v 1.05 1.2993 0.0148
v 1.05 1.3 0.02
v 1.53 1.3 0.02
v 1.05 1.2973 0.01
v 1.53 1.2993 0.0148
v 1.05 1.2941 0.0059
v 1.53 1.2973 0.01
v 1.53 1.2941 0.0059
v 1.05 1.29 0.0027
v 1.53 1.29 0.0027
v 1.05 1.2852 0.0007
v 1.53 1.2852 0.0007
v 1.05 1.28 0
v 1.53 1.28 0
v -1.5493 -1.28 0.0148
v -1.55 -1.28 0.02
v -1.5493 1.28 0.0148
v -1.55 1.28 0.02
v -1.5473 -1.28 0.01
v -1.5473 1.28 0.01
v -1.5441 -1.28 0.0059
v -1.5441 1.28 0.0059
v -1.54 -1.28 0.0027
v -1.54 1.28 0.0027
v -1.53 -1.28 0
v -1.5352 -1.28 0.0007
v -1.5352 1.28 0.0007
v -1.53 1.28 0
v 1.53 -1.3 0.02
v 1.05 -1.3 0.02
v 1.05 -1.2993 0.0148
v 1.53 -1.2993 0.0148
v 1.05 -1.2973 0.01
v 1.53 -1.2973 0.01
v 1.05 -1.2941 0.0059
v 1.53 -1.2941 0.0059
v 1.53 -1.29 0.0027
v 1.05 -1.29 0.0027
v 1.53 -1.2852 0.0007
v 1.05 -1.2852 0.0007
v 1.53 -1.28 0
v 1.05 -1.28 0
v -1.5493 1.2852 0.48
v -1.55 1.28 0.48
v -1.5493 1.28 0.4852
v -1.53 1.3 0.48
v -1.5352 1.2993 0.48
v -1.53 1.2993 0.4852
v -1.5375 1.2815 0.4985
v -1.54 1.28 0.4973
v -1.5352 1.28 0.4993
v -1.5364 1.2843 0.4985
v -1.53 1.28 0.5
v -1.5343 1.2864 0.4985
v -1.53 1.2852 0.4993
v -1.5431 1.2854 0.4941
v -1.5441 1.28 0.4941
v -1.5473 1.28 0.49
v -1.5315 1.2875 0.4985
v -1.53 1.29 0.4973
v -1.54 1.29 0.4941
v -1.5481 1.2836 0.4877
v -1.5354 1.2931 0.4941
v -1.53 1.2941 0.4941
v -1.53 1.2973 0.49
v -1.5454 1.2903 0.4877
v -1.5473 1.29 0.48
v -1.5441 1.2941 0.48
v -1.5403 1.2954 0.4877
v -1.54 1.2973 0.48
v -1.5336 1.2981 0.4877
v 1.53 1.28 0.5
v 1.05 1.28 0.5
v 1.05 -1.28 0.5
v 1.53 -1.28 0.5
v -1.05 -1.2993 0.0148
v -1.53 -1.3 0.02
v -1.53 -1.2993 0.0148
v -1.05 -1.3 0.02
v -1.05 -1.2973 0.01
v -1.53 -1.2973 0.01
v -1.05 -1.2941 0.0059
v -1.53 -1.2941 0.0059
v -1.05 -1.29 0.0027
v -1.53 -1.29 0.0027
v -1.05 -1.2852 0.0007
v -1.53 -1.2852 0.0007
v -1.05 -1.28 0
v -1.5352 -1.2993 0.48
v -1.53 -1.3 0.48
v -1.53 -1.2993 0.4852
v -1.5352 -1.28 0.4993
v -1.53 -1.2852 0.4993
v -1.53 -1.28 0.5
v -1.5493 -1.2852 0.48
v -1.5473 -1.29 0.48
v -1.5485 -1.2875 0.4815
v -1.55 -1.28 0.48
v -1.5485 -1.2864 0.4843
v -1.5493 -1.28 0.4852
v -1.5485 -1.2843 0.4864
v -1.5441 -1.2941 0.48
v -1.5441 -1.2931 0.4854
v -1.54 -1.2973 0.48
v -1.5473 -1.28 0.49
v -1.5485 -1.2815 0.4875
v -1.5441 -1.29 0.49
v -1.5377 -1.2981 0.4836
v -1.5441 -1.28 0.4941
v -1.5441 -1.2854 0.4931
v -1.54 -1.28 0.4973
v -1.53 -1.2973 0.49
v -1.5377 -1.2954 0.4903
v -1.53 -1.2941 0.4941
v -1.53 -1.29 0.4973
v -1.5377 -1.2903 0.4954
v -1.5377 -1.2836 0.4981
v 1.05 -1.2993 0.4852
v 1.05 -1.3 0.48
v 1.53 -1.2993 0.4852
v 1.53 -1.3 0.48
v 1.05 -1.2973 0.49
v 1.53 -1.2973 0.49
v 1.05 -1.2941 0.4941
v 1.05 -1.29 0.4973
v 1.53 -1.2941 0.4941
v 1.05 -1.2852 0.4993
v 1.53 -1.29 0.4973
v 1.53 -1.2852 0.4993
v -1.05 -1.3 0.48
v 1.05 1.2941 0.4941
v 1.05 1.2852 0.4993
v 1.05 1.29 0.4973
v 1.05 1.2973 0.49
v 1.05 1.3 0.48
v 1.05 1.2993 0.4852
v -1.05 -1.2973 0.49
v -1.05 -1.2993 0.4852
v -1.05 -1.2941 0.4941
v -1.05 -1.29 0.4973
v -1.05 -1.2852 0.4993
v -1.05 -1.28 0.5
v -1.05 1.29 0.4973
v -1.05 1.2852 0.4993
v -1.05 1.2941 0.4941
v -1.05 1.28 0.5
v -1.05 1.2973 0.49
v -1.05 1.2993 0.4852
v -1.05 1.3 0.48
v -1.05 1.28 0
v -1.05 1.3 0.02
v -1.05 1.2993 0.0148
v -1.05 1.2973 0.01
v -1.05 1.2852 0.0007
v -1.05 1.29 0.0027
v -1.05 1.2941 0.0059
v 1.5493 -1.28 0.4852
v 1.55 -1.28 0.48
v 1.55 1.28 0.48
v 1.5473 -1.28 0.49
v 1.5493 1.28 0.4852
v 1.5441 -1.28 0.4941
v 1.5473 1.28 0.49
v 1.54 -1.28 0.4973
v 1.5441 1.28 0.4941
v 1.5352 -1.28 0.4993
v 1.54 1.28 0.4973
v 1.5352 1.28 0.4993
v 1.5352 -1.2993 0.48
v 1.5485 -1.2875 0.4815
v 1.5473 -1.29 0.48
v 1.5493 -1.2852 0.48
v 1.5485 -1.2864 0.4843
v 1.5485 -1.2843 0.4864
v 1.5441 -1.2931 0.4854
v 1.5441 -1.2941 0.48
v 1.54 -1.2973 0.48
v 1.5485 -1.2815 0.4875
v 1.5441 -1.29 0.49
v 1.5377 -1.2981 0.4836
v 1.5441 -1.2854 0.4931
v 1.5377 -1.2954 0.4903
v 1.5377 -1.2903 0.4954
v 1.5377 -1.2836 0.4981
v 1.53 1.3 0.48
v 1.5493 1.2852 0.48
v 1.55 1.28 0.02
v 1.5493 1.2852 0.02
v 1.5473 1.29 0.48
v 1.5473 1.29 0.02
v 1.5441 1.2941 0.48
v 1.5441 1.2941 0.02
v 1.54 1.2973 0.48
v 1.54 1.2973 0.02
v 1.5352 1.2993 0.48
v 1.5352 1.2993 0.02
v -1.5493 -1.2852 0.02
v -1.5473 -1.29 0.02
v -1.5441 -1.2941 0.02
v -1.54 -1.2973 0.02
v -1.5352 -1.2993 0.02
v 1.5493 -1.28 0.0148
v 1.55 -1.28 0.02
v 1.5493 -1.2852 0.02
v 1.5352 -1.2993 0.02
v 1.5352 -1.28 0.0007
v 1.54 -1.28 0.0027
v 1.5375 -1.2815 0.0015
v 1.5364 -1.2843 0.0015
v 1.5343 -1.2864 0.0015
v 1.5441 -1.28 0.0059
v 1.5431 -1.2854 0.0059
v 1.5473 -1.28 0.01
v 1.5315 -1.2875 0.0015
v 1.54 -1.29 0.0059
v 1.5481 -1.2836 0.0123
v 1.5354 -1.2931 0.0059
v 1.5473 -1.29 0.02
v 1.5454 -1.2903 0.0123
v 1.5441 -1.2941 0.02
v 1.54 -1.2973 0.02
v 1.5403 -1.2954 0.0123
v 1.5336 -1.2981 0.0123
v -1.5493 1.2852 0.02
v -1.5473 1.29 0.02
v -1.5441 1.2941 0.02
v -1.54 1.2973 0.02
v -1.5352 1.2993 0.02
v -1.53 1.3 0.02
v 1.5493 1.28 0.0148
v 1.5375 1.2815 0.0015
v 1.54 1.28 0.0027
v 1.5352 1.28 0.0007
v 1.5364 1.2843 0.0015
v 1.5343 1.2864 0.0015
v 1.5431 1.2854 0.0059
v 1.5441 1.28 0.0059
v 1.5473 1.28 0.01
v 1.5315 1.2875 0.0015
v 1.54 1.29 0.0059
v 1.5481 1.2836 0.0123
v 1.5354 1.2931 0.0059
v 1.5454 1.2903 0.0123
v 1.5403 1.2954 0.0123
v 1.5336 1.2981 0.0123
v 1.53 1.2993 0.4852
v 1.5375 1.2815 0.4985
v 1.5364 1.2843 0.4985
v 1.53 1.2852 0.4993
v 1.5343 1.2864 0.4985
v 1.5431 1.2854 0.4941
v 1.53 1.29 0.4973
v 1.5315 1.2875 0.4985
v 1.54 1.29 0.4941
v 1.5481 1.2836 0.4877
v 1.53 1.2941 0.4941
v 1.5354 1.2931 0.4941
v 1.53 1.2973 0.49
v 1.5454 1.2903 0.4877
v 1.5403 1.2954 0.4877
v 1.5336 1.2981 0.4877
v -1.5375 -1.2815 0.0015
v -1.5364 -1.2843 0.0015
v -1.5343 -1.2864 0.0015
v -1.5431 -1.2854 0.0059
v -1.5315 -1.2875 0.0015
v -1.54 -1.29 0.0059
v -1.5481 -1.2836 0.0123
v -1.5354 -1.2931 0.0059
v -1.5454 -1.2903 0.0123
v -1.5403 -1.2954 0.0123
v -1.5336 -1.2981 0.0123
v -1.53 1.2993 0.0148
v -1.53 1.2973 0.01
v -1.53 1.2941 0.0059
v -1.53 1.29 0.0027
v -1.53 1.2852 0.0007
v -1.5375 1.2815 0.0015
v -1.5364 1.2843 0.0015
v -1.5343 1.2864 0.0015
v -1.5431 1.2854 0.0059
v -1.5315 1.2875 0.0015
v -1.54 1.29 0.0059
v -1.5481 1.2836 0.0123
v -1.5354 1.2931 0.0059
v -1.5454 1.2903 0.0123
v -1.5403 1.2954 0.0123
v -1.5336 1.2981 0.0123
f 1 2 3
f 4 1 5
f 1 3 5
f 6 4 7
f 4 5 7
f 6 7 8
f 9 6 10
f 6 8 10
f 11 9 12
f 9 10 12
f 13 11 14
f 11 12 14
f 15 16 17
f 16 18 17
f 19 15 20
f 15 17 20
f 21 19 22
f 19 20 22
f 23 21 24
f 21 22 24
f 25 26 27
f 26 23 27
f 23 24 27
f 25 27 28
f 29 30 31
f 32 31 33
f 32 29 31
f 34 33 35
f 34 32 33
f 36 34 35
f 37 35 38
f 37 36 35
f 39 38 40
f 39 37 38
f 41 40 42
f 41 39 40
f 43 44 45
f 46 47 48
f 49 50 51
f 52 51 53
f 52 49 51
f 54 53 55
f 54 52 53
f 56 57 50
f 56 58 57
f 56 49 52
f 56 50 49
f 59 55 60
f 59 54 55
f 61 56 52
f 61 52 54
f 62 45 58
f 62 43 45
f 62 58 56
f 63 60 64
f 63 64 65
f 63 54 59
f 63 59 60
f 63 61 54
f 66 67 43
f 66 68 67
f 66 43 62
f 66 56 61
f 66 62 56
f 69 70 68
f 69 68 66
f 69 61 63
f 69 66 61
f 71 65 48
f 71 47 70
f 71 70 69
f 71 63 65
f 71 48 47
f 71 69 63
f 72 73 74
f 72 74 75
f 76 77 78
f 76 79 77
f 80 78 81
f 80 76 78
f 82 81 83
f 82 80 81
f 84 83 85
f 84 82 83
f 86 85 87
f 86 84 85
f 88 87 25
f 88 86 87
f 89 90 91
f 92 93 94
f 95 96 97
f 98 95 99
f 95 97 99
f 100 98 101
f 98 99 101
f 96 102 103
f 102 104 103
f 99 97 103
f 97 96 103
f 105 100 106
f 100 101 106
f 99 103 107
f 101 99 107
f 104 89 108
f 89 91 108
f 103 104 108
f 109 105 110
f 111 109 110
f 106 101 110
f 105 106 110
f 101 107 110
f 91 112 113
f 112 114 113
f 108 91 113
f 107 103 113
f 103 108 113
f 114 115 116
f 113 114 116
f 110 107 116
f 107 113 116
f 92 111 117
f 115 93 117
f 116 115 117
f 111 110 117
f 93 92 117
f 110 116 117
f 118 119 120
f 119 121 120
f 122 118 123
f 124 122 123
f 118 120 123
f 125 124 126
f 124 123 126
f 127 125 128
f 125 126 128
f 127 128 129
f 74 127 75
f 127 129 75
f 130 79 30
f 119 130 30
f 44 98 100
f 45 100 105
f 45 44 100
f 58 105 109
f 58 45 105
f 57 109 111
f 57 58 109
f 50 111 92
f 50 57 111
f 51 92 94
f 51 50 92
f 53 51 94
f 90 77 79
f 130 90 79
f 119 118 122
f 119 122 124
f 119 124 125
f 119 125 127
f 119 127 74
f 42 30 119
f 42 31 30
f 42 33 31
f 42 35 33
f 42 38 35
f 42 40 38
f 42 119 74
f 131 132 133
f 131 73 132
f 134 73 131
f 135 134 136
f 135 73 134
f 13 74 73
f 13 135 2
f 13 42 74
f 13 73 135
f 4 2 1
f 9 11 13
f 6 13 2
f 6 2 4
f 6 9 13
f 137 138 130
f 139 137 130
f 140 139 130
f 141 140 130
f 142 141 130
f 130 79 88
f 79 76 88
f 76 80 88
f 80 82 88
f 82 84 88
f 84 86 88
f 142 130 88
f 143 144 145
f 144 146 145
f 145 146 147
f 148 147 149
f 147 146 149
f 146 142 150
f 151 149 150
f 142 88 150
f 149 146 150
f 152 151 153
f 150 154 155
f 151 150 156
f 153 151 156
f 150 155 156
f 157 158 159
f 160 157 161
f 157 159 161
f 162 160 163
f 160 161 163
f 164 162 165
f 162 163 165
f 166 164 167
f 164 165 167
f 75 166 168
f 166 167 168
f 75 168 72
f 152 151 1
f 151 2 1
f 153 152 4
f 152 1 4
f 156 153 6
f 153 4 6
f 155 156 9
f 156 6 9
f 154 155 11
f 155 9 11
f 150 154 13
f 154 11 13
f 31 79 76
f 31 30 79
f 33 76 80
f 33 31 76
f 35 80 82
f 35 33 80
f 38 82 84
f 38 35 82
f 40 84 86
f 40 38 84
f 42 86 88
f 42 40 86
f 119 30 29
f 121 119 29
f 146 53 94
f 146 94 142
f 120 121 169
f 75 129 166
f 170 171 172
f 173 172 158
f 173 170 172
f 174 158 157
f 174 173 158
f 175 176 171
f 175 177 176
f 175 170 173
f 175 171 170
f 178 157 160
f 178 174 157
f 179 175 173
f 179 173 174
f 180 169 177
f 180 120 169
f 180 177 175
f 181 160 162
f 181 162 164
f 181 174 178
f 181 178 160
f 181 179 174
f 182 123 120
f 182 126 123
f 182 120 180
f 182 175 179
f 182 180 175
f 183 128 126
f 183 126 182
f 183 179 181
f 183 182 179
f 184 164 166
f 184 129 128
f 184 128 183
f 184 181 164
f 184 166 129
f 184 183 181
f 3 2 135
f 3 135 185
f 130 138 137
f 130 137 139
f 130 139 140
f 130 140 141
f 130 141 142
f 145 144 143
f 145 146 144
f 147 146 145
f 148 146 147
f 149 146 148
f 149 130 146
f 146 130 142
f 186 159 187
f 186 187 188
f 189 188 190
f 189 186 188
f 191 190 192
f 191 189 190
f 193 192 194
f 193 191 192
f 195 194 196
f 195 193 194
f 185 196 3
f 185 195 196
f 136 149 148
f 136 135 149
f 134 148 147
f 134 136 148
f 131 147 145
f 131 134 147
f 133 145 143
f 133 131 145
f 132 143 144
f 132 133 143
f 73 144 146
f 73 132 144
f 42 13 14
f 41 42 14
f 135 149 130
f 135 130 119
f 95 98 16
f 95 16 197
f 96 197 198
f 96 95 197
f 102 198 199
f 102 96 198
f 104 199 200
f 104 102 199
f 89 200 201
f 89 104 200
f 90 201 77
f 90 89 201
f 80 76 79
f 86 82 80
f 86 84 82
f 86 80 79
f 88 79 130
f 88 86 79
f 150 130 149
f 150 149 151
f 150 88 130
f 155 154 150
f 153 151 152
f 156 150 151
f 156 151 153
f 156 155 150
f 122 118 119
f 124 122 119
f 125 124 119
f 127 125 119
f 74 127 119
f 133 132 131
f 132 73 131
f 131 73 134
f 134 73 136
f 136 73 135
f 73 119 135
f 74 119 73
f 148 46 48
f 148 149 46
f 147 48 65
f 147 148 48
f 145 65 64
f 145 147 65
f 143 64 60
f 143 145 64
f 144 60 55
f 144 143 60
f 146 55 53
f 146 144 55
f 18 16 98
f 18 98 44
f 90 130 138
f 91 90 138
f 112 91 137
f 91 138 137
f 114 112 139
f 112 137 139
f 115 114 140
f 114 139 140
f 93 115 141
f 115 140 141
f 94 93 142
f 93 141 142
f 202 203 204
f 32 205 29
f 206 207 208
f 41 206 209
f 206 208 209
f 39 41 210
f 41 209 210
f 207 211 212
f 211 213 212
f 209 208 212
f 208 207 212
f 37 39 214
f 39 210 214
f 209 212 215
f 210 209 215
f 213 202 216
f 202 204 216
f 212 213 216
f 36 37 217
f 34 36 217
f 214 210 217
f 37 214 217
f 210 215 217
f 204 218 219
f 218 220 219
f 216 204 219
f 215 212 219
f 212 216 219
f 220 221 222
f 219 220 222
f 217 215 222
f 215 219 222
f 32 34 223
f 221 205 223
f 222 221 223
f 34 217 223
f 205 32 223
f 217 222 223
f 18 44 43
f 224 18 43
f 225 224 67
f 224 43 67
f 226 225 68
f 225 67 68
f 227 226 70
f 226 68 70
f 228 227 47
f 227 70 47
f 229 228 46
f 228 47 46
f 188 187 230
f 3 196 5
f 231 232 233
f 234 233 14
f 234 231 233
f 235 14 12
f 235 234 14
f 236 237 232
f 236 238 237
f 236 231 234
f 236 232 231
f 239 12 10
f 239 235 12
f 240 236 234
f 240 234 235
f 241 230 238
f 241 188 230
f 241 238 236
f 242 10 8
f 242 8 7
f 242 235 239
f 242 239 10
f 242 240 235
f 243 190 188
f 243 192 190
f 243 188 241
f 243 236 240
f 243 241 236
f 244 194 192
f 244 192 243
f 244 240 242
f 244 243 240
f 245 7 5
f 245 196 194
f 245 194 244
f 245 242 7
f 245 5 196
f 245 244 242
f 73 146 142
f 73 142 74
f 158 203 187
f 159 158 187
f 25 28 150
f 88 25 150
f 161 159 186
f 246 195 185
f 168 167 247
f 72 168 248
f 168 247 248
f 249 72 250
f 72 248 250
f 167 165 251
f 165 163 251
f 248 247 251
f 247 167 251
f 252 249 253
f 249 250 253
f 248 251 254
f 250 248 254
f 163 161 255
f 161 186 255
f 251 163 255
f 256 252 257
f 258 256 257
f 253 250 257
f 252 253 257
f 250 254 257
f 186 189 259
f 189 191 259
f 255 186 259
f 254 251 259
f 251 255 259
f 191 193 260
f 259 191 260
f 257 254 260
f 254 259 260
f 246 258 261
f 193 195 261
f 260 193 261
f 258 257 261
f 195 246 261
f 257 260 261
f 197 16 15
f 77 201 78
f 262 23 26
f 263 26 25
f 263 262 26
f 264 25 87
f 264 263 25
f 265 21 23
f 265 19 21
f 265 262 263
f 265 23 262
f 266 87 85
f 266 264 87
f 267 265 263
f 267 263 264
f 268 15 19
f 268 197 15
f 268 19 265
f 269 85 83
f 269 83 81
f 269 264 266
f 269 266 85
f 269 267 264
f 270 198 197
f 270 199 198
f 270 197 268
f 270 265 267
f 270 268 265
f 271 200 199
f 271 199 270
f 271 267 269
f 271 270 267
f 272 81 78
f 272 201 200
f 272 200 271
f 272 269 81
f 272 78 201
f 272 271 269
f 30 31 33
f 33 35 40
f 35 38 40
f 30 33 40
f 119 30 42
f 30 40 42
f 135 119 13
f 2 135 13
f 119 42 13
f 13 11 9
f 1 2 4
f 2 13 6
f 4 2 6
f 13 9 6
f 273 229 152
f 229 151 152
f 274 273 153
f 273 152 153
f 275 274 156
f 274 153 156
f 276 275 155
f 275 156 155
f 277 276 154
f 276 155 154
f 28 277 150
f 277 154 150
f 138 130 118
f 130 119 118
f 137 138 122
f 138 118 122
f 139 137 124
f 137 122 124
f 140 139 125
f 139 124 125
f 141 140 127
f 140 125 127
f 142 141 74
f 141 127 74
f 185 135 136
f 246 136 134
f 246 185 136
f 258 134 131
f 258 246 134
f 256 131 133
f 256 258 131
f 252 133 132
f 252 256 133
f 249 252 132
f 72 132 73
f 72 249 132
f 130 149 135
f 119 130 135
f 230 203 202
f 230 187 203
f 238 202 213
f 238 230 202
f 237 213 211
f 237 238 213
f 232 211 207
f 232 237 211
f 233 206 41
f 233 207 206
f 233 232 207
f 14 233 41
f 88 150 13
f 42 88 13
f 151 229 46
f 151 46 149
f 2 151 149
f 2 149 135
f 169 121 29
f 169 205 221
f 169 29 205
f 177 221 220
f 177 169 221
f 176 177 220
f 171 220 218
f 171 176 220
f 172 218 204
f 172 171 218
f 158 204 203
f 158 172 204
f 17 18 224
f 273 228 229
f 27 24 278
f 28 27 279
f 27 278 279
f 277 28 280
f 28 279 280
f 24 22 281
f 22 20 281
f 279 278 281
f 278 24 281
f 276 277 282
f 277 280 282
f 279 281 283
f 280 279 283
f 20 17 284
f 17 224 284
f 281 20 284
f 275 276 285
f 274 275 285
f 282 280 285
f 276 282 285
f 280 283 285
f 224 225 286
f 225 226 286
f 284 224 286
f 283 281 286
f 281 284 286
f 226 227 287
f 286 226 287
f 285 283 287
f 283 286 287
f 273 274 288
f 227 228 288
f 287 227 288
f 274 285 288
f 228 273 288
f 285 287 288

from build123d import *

# Parameters (mm, degrees)
F2_W     = 2.1
F2_H     = 2.6
F3_DEPTH = 0.48
F2_W_2   = 0.5
F4_DEPTH = 0.5
F5_DEPTH = 0.5
F6_DEPTH = 0.02
F7_R     = 0.01999
F7_2_R   = 0.01999
F7_3_R   = 0.01999
F7_4_R   = 0.01999


# Not quite as in the source:
# - a fillet or chamfer is up to 0.001 mm smaller than in the source, because OpenCascade refuses the exact size


with BuildPart() as f3:
    # F2 (on Top) → F3 (new body)
    with BuildSketch(Plane.XY):
        Rectangle(F2_W, F2_H)
    extrude(amount=F3_DEPTH)


with BuildPart() as f4:
    # F2 (on Top) → F4 (new body)
    with BuildSketch(Plane.XY):
        with Locations((-1.3, 0)):
            Rectangle(F2_W_2, F2_H)
    extrude(amount=F4_DEPTH)

    # F7 (radius 0.02 in the source; OpenCascade refuses exactly that, so slightly less here)
    f7_edges = [f4.edges().sort_by_distance(p)[0] for p in [
        (-1.3, -1.3, 0.5),
        (-1.55, 1.3, 0.25),
        (-1.55, -1.3, 0.25),
        (-1.55, 0, 0),
        (-1.55, 0, 0.5),
        (-1.3, 1.3, 0.5),
        (-1.3, 1.3, 0),
        (-1.3, -1.3, 0),
    ]]
    fillet(f7_edges, radius=F7_R)


with BuildPart() as f5:
    # F2 (on Top) → F5 (new body)
    with BuildSketch(Plane.XY):
        with Locations((1.3, 0)):
            Rectangle(F2_W_2, F2_H)
    extrude(amount=F5_DEPTH)

    # F7#2 (radius 0.02 in the source; OpenCascade refuses exactly that, so slightly less here)
    f7_2_edges = [f5.edges().sort_by_distance(p)[0] for p in [
        (1.3, -1.3, 0.5),
        (1.55, -1.3, 0.25),
        (1.55, 1.3, 0.25),
        (1.55, 0, 0),
        (1.55, 0, 0.5),
        (1.3, 1.3, 0.5),
        (1.3, 1.3, 0),
        (1.3, -1.3, 0),
    ]]
    fillet(f7_2_edges, radius=F7_2_R)


with BuildPart() as f6:
    # F6 (new): a face of the model
    f6_faces = [f3.part.faces().sort_by_distance(p)[0] for p in [
        (0, 0, 0.48),
    ]]
    extrude(f6_faces, amount=F6_DEPTH)

    # F7#4 (radius 0.02 in the source; OpenCascade refuses exactly that, so slightly less here)
    f7_4_edges = [f6.edges().sort_by_distance(p)[0] for p in [
        (0, -1.3, 0.5),
        (0, 1.3, 0.5),
    ]]
    fillet(f7_4_edges, radius=F7_4_R)


with BuildPart() as f3_1:
    add(f3.part)

    # F7#3 (radius 0.02 in the source; OpenCascade refuses exactly that, so slightly less here)
    f7_3_edges = [f3_1.edges().sort_by_distance(p)[0] for p in [
        (0, 1.3, 0),
        (0, -1.3, 0),
    ]]
    fillet(f7_3_edges, radius=F7_3_R)


solid = Compound([f4.part, f5.part, f6.part, f3_1.part])
